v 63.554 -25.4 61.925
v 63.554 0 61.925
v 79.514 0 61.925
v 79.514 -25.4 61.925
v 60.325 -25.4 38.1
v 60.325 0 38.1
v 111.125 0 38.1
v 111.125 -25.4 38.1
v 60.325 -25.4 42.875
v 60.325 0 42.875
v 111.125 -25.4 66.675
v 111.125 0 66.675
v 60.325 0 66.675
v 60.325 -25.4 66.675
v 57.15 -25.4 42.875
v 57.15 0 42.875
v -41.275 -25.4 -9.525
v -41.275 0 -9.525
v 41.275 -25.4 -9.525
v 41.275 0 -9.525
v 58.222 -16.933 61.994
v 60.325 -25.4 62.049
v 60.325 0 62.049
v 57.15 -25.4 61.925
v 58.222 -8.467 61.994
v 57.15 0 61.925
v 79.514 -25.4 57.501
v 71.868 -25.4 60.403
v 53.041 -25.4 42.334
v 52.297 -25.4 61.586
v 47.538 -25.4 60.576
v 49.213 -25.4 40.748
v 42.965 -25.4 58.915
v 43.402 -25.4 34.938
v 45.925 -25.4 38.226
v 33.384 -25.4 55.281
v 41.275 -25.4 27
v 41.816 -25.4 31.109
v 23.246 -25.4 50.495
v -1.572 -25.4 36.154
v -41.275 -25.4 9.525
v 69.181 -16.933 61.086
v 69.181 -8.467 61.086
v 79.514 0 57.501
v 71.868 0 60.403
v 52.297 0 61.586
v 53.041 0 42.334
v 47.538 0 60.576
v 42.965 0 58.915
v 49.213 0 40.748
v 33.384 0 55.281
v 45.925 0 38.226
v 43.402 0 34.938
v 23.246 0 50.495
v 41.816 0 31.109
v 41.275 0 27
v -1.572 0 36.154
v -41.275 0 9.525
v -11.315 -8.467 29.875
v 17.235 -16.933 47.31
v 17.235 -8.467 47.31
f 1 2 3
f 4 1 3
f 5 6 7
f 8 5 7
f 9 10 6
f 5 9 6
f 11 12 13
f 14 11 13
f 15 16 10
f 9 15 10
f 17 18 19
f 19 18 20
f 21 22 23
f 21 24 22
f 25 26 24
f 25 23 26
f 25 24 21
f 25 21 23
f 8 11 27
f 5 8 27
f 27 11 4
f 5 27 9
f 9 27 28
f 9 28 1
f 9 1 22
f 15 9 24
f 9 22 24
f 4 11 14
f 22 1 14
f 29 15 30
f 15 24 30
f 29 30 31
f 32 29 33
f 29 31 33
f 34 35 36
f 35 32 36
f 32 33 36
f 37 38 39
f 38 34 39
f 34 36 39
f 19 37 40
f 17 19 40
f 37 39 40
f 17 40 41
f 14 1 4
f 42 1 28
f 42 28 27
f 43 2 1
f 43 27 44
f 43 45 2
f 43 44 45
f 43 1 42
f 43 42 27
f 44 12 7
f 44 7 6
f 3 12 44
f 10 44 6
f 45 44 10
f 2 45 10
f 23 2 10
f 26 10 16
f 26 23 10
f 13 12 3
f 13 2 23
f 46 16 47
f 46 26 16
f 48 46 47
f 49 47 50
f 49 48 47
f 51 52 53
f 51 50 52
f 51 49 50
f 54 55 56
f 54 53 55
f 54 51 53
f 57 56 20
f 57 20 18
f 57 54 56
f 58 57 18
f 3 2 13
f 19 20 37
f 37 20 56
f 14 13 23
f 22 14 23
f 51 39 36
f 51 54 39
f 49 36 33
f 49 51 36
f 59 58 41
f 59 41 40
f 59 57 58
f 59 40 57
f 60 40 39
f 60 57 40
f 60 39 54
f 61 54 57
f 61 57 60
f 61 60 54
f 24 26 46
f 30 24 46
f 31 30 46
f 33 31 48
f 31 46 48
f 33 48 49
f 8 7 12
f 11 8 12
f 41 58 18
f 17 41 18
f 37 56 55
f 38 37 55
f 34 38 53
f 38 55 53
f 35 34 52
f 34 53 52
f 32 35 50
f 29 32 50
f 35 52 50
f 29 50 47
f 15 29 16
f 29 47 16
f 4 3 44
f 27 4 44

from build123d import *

# Parameters (mm, degrees)
F1_DEPTH = 25.4


with BuildPart() as f1:
    # F0 (on Front) → F1 (new body)
    with BuildSketch(Plane.XZ):
        with BuildLine():
            add(Edge.make_bspline(
                [(-41.275, 9.525), (-11.0804249201, 30.3606307657), (19.1141501598, 51.1962615313), (42.965290813, 58.9149246625)],
                knots=[0, 0, 0, 0, 0.5181088639, 0.5181088639, 0.5181088639, 0.5181088639], degree=3))
            Line((-41.275, 9.525), (22.225, 9.525))
            Line((22.225, 9.525), (22.225, 27.0002))
            ThreePointArc((22.225, 27.0002), (27.86556221, 46.0311571047), (42.965290813, 58.9149246625))
        make_face()
        Polygon((22.225, 9.525), (-41.275, 9.525), (-41.275, -9.525), (41.275, -9.525), (41.275, 9.525), align=None)
        with BuildLine():
            Line((22.225, 27.0002), (22.225, 9.525))
            Line((22.225, 9.525), (41.275, 9.525))
            Line((41.275, 9.525), (41.275, 27.0002))
            ThreePointArc((41.275, 27.0002), (45.9246798487, 38.2255201513), (57.15, 42.8752))
            Line((57.15, 42.8752), (60.325, 42.8752))
            Line((60.325, 42.8752), (60.325, 61.9252))
            Line((60.325, 61.9252), (57.15, 61.9252))
            add(Edge.make_bspline(
                [(42.965290813, 58.9149246625), (47.9955126784, 60.5427959923), (52.7435843005, 61.5872364295), (57.15, 61.9252)],
                knots=[0.5181088639, 0.5181088639, 0.5181088639, 0.5181088639, 0.6273783774, 0.6273783774, 0.6273783774, 0.6273783774], degree=3))
            ThreePointArc((42.965290813, 58.9149246625), (27.86556221, 46.0311571047), (22.225, 27.0002))
        make_face()
        with BuildLine():
            ThreePointArc((57.15, 61.9252), (49.8996942767, 61.1643433658), (42.965290813, 58.9149246625))
            add(Edge.make_bspline(
                [(42.965290813, 58.9149246625), (47.9955126784, 60.5427959923), (52.7435843005, 61.5872364295), (57.15, 61.9252)],
                knots=[0.5181088639, 0.5181088639, 0.5181088639, 0.5181088639, 0.6273783774, 0.6273783774, 0.6273783774, 0.6273783774], degree=3))
        make_face()
        with BuildLine():
            add(Edge.make_bspline(
                [(57.15, 61.9252), (58.2283036755, 62.0079038085), (59.2861476071, 62.0483009137), (60.325, 62.0494272736)],
                knots=[0.6273783774, 0.6273783774, 0.6273783774, 0.6273783774, 0.6541179604, 0.6541179604, 0.6541179604, 0.6541179604], degree=3))
            Line((57.15, 61.9252), (60.325, 61.9252))
            Line((60.325, 61.9252), (60.325, 62.0494272736))
        make_face()
        with BuildLine():
            Line((63.5542024739, 61.9252), (60.325, 61.9252))
            Line((60.325, 61.9252), (60.325, 42.8752))
            Line((60.325, 42.8752), (79.5137885917, 42.8752))
            Line((79.5137885917, 42.8752), (79.5137885917, 57.5008483247))
            add(Edge.make_bspline(
                [(63.5542024739, 61.9252), (69.3669017095, 61.4695059449), (74.5907566053, 59.7961982711), (79.5137885917, 57.5008483247)],
                knots=[0.6823542793, 0.6823542793, 0.6823542793, 0.6823542793, 0.8377243298, 0.8377243298, 0.8377243298, 0.8377243298], degree=3))
        make_face()
        with BuildLine():
            Line((60.325, 62.0494272736), (60.325, 61.9252))
            Line((60.325, 61.9252), (63.5542024739, 61.9252))
            add(Edge.make_bspline(
                [(60.325, 62.0494272736), (61.4220016822, 62.050616681), (62.4978262371, 62.0080159778), (63.5542024739, 61.9252)],
                knots=[0.6541179604, 0.6541179604, 0.6541179604, 0.6541179604, 0.6823542793, 0.6823542793, 0.6823542793, 0.6823542793], degree=3))
        make_face()
        with BuildLine():
            Line((60.325, 66.675), (60.325, 62.0494272736))
            add(Edge.make_bspline(
                [(60.325, 62.0494272736), (61.4220016822, 62.050616681), (62.4978262371, 62.0080159778), (63.5542024739, 61.9252)],
                knots=[0.6541179604, 0.6541179604, 0.6541179604, 0.6541179604, 0.6823542793, 0.6823542793, 0.6823542793, 0.6823542793], degree=3))
            Line((63.5542024739, 61.9252), (79.5137885917, 61.9252))
            Line((79.5137885917, 61.9252), (79.5137885917, 57.5008483247))
            Line((79.5137885917, 57.5008483247), (79.5137885917, 42.8752))
            Line((79.5137885917, 42.8752), (60.325, 42.8752))
            Line((60.325, 42.8752), (60.325, 38.1))
            Line((60.325, 38.1), (111.125, 38.1))
            Line((111.125, 38.1), (111.125, 66.675))
            Line((111.125, 66.675), (60.325, 66.675))
        make_face()
    extrude(amount=F1_DEPTH)


solid = f1.part
